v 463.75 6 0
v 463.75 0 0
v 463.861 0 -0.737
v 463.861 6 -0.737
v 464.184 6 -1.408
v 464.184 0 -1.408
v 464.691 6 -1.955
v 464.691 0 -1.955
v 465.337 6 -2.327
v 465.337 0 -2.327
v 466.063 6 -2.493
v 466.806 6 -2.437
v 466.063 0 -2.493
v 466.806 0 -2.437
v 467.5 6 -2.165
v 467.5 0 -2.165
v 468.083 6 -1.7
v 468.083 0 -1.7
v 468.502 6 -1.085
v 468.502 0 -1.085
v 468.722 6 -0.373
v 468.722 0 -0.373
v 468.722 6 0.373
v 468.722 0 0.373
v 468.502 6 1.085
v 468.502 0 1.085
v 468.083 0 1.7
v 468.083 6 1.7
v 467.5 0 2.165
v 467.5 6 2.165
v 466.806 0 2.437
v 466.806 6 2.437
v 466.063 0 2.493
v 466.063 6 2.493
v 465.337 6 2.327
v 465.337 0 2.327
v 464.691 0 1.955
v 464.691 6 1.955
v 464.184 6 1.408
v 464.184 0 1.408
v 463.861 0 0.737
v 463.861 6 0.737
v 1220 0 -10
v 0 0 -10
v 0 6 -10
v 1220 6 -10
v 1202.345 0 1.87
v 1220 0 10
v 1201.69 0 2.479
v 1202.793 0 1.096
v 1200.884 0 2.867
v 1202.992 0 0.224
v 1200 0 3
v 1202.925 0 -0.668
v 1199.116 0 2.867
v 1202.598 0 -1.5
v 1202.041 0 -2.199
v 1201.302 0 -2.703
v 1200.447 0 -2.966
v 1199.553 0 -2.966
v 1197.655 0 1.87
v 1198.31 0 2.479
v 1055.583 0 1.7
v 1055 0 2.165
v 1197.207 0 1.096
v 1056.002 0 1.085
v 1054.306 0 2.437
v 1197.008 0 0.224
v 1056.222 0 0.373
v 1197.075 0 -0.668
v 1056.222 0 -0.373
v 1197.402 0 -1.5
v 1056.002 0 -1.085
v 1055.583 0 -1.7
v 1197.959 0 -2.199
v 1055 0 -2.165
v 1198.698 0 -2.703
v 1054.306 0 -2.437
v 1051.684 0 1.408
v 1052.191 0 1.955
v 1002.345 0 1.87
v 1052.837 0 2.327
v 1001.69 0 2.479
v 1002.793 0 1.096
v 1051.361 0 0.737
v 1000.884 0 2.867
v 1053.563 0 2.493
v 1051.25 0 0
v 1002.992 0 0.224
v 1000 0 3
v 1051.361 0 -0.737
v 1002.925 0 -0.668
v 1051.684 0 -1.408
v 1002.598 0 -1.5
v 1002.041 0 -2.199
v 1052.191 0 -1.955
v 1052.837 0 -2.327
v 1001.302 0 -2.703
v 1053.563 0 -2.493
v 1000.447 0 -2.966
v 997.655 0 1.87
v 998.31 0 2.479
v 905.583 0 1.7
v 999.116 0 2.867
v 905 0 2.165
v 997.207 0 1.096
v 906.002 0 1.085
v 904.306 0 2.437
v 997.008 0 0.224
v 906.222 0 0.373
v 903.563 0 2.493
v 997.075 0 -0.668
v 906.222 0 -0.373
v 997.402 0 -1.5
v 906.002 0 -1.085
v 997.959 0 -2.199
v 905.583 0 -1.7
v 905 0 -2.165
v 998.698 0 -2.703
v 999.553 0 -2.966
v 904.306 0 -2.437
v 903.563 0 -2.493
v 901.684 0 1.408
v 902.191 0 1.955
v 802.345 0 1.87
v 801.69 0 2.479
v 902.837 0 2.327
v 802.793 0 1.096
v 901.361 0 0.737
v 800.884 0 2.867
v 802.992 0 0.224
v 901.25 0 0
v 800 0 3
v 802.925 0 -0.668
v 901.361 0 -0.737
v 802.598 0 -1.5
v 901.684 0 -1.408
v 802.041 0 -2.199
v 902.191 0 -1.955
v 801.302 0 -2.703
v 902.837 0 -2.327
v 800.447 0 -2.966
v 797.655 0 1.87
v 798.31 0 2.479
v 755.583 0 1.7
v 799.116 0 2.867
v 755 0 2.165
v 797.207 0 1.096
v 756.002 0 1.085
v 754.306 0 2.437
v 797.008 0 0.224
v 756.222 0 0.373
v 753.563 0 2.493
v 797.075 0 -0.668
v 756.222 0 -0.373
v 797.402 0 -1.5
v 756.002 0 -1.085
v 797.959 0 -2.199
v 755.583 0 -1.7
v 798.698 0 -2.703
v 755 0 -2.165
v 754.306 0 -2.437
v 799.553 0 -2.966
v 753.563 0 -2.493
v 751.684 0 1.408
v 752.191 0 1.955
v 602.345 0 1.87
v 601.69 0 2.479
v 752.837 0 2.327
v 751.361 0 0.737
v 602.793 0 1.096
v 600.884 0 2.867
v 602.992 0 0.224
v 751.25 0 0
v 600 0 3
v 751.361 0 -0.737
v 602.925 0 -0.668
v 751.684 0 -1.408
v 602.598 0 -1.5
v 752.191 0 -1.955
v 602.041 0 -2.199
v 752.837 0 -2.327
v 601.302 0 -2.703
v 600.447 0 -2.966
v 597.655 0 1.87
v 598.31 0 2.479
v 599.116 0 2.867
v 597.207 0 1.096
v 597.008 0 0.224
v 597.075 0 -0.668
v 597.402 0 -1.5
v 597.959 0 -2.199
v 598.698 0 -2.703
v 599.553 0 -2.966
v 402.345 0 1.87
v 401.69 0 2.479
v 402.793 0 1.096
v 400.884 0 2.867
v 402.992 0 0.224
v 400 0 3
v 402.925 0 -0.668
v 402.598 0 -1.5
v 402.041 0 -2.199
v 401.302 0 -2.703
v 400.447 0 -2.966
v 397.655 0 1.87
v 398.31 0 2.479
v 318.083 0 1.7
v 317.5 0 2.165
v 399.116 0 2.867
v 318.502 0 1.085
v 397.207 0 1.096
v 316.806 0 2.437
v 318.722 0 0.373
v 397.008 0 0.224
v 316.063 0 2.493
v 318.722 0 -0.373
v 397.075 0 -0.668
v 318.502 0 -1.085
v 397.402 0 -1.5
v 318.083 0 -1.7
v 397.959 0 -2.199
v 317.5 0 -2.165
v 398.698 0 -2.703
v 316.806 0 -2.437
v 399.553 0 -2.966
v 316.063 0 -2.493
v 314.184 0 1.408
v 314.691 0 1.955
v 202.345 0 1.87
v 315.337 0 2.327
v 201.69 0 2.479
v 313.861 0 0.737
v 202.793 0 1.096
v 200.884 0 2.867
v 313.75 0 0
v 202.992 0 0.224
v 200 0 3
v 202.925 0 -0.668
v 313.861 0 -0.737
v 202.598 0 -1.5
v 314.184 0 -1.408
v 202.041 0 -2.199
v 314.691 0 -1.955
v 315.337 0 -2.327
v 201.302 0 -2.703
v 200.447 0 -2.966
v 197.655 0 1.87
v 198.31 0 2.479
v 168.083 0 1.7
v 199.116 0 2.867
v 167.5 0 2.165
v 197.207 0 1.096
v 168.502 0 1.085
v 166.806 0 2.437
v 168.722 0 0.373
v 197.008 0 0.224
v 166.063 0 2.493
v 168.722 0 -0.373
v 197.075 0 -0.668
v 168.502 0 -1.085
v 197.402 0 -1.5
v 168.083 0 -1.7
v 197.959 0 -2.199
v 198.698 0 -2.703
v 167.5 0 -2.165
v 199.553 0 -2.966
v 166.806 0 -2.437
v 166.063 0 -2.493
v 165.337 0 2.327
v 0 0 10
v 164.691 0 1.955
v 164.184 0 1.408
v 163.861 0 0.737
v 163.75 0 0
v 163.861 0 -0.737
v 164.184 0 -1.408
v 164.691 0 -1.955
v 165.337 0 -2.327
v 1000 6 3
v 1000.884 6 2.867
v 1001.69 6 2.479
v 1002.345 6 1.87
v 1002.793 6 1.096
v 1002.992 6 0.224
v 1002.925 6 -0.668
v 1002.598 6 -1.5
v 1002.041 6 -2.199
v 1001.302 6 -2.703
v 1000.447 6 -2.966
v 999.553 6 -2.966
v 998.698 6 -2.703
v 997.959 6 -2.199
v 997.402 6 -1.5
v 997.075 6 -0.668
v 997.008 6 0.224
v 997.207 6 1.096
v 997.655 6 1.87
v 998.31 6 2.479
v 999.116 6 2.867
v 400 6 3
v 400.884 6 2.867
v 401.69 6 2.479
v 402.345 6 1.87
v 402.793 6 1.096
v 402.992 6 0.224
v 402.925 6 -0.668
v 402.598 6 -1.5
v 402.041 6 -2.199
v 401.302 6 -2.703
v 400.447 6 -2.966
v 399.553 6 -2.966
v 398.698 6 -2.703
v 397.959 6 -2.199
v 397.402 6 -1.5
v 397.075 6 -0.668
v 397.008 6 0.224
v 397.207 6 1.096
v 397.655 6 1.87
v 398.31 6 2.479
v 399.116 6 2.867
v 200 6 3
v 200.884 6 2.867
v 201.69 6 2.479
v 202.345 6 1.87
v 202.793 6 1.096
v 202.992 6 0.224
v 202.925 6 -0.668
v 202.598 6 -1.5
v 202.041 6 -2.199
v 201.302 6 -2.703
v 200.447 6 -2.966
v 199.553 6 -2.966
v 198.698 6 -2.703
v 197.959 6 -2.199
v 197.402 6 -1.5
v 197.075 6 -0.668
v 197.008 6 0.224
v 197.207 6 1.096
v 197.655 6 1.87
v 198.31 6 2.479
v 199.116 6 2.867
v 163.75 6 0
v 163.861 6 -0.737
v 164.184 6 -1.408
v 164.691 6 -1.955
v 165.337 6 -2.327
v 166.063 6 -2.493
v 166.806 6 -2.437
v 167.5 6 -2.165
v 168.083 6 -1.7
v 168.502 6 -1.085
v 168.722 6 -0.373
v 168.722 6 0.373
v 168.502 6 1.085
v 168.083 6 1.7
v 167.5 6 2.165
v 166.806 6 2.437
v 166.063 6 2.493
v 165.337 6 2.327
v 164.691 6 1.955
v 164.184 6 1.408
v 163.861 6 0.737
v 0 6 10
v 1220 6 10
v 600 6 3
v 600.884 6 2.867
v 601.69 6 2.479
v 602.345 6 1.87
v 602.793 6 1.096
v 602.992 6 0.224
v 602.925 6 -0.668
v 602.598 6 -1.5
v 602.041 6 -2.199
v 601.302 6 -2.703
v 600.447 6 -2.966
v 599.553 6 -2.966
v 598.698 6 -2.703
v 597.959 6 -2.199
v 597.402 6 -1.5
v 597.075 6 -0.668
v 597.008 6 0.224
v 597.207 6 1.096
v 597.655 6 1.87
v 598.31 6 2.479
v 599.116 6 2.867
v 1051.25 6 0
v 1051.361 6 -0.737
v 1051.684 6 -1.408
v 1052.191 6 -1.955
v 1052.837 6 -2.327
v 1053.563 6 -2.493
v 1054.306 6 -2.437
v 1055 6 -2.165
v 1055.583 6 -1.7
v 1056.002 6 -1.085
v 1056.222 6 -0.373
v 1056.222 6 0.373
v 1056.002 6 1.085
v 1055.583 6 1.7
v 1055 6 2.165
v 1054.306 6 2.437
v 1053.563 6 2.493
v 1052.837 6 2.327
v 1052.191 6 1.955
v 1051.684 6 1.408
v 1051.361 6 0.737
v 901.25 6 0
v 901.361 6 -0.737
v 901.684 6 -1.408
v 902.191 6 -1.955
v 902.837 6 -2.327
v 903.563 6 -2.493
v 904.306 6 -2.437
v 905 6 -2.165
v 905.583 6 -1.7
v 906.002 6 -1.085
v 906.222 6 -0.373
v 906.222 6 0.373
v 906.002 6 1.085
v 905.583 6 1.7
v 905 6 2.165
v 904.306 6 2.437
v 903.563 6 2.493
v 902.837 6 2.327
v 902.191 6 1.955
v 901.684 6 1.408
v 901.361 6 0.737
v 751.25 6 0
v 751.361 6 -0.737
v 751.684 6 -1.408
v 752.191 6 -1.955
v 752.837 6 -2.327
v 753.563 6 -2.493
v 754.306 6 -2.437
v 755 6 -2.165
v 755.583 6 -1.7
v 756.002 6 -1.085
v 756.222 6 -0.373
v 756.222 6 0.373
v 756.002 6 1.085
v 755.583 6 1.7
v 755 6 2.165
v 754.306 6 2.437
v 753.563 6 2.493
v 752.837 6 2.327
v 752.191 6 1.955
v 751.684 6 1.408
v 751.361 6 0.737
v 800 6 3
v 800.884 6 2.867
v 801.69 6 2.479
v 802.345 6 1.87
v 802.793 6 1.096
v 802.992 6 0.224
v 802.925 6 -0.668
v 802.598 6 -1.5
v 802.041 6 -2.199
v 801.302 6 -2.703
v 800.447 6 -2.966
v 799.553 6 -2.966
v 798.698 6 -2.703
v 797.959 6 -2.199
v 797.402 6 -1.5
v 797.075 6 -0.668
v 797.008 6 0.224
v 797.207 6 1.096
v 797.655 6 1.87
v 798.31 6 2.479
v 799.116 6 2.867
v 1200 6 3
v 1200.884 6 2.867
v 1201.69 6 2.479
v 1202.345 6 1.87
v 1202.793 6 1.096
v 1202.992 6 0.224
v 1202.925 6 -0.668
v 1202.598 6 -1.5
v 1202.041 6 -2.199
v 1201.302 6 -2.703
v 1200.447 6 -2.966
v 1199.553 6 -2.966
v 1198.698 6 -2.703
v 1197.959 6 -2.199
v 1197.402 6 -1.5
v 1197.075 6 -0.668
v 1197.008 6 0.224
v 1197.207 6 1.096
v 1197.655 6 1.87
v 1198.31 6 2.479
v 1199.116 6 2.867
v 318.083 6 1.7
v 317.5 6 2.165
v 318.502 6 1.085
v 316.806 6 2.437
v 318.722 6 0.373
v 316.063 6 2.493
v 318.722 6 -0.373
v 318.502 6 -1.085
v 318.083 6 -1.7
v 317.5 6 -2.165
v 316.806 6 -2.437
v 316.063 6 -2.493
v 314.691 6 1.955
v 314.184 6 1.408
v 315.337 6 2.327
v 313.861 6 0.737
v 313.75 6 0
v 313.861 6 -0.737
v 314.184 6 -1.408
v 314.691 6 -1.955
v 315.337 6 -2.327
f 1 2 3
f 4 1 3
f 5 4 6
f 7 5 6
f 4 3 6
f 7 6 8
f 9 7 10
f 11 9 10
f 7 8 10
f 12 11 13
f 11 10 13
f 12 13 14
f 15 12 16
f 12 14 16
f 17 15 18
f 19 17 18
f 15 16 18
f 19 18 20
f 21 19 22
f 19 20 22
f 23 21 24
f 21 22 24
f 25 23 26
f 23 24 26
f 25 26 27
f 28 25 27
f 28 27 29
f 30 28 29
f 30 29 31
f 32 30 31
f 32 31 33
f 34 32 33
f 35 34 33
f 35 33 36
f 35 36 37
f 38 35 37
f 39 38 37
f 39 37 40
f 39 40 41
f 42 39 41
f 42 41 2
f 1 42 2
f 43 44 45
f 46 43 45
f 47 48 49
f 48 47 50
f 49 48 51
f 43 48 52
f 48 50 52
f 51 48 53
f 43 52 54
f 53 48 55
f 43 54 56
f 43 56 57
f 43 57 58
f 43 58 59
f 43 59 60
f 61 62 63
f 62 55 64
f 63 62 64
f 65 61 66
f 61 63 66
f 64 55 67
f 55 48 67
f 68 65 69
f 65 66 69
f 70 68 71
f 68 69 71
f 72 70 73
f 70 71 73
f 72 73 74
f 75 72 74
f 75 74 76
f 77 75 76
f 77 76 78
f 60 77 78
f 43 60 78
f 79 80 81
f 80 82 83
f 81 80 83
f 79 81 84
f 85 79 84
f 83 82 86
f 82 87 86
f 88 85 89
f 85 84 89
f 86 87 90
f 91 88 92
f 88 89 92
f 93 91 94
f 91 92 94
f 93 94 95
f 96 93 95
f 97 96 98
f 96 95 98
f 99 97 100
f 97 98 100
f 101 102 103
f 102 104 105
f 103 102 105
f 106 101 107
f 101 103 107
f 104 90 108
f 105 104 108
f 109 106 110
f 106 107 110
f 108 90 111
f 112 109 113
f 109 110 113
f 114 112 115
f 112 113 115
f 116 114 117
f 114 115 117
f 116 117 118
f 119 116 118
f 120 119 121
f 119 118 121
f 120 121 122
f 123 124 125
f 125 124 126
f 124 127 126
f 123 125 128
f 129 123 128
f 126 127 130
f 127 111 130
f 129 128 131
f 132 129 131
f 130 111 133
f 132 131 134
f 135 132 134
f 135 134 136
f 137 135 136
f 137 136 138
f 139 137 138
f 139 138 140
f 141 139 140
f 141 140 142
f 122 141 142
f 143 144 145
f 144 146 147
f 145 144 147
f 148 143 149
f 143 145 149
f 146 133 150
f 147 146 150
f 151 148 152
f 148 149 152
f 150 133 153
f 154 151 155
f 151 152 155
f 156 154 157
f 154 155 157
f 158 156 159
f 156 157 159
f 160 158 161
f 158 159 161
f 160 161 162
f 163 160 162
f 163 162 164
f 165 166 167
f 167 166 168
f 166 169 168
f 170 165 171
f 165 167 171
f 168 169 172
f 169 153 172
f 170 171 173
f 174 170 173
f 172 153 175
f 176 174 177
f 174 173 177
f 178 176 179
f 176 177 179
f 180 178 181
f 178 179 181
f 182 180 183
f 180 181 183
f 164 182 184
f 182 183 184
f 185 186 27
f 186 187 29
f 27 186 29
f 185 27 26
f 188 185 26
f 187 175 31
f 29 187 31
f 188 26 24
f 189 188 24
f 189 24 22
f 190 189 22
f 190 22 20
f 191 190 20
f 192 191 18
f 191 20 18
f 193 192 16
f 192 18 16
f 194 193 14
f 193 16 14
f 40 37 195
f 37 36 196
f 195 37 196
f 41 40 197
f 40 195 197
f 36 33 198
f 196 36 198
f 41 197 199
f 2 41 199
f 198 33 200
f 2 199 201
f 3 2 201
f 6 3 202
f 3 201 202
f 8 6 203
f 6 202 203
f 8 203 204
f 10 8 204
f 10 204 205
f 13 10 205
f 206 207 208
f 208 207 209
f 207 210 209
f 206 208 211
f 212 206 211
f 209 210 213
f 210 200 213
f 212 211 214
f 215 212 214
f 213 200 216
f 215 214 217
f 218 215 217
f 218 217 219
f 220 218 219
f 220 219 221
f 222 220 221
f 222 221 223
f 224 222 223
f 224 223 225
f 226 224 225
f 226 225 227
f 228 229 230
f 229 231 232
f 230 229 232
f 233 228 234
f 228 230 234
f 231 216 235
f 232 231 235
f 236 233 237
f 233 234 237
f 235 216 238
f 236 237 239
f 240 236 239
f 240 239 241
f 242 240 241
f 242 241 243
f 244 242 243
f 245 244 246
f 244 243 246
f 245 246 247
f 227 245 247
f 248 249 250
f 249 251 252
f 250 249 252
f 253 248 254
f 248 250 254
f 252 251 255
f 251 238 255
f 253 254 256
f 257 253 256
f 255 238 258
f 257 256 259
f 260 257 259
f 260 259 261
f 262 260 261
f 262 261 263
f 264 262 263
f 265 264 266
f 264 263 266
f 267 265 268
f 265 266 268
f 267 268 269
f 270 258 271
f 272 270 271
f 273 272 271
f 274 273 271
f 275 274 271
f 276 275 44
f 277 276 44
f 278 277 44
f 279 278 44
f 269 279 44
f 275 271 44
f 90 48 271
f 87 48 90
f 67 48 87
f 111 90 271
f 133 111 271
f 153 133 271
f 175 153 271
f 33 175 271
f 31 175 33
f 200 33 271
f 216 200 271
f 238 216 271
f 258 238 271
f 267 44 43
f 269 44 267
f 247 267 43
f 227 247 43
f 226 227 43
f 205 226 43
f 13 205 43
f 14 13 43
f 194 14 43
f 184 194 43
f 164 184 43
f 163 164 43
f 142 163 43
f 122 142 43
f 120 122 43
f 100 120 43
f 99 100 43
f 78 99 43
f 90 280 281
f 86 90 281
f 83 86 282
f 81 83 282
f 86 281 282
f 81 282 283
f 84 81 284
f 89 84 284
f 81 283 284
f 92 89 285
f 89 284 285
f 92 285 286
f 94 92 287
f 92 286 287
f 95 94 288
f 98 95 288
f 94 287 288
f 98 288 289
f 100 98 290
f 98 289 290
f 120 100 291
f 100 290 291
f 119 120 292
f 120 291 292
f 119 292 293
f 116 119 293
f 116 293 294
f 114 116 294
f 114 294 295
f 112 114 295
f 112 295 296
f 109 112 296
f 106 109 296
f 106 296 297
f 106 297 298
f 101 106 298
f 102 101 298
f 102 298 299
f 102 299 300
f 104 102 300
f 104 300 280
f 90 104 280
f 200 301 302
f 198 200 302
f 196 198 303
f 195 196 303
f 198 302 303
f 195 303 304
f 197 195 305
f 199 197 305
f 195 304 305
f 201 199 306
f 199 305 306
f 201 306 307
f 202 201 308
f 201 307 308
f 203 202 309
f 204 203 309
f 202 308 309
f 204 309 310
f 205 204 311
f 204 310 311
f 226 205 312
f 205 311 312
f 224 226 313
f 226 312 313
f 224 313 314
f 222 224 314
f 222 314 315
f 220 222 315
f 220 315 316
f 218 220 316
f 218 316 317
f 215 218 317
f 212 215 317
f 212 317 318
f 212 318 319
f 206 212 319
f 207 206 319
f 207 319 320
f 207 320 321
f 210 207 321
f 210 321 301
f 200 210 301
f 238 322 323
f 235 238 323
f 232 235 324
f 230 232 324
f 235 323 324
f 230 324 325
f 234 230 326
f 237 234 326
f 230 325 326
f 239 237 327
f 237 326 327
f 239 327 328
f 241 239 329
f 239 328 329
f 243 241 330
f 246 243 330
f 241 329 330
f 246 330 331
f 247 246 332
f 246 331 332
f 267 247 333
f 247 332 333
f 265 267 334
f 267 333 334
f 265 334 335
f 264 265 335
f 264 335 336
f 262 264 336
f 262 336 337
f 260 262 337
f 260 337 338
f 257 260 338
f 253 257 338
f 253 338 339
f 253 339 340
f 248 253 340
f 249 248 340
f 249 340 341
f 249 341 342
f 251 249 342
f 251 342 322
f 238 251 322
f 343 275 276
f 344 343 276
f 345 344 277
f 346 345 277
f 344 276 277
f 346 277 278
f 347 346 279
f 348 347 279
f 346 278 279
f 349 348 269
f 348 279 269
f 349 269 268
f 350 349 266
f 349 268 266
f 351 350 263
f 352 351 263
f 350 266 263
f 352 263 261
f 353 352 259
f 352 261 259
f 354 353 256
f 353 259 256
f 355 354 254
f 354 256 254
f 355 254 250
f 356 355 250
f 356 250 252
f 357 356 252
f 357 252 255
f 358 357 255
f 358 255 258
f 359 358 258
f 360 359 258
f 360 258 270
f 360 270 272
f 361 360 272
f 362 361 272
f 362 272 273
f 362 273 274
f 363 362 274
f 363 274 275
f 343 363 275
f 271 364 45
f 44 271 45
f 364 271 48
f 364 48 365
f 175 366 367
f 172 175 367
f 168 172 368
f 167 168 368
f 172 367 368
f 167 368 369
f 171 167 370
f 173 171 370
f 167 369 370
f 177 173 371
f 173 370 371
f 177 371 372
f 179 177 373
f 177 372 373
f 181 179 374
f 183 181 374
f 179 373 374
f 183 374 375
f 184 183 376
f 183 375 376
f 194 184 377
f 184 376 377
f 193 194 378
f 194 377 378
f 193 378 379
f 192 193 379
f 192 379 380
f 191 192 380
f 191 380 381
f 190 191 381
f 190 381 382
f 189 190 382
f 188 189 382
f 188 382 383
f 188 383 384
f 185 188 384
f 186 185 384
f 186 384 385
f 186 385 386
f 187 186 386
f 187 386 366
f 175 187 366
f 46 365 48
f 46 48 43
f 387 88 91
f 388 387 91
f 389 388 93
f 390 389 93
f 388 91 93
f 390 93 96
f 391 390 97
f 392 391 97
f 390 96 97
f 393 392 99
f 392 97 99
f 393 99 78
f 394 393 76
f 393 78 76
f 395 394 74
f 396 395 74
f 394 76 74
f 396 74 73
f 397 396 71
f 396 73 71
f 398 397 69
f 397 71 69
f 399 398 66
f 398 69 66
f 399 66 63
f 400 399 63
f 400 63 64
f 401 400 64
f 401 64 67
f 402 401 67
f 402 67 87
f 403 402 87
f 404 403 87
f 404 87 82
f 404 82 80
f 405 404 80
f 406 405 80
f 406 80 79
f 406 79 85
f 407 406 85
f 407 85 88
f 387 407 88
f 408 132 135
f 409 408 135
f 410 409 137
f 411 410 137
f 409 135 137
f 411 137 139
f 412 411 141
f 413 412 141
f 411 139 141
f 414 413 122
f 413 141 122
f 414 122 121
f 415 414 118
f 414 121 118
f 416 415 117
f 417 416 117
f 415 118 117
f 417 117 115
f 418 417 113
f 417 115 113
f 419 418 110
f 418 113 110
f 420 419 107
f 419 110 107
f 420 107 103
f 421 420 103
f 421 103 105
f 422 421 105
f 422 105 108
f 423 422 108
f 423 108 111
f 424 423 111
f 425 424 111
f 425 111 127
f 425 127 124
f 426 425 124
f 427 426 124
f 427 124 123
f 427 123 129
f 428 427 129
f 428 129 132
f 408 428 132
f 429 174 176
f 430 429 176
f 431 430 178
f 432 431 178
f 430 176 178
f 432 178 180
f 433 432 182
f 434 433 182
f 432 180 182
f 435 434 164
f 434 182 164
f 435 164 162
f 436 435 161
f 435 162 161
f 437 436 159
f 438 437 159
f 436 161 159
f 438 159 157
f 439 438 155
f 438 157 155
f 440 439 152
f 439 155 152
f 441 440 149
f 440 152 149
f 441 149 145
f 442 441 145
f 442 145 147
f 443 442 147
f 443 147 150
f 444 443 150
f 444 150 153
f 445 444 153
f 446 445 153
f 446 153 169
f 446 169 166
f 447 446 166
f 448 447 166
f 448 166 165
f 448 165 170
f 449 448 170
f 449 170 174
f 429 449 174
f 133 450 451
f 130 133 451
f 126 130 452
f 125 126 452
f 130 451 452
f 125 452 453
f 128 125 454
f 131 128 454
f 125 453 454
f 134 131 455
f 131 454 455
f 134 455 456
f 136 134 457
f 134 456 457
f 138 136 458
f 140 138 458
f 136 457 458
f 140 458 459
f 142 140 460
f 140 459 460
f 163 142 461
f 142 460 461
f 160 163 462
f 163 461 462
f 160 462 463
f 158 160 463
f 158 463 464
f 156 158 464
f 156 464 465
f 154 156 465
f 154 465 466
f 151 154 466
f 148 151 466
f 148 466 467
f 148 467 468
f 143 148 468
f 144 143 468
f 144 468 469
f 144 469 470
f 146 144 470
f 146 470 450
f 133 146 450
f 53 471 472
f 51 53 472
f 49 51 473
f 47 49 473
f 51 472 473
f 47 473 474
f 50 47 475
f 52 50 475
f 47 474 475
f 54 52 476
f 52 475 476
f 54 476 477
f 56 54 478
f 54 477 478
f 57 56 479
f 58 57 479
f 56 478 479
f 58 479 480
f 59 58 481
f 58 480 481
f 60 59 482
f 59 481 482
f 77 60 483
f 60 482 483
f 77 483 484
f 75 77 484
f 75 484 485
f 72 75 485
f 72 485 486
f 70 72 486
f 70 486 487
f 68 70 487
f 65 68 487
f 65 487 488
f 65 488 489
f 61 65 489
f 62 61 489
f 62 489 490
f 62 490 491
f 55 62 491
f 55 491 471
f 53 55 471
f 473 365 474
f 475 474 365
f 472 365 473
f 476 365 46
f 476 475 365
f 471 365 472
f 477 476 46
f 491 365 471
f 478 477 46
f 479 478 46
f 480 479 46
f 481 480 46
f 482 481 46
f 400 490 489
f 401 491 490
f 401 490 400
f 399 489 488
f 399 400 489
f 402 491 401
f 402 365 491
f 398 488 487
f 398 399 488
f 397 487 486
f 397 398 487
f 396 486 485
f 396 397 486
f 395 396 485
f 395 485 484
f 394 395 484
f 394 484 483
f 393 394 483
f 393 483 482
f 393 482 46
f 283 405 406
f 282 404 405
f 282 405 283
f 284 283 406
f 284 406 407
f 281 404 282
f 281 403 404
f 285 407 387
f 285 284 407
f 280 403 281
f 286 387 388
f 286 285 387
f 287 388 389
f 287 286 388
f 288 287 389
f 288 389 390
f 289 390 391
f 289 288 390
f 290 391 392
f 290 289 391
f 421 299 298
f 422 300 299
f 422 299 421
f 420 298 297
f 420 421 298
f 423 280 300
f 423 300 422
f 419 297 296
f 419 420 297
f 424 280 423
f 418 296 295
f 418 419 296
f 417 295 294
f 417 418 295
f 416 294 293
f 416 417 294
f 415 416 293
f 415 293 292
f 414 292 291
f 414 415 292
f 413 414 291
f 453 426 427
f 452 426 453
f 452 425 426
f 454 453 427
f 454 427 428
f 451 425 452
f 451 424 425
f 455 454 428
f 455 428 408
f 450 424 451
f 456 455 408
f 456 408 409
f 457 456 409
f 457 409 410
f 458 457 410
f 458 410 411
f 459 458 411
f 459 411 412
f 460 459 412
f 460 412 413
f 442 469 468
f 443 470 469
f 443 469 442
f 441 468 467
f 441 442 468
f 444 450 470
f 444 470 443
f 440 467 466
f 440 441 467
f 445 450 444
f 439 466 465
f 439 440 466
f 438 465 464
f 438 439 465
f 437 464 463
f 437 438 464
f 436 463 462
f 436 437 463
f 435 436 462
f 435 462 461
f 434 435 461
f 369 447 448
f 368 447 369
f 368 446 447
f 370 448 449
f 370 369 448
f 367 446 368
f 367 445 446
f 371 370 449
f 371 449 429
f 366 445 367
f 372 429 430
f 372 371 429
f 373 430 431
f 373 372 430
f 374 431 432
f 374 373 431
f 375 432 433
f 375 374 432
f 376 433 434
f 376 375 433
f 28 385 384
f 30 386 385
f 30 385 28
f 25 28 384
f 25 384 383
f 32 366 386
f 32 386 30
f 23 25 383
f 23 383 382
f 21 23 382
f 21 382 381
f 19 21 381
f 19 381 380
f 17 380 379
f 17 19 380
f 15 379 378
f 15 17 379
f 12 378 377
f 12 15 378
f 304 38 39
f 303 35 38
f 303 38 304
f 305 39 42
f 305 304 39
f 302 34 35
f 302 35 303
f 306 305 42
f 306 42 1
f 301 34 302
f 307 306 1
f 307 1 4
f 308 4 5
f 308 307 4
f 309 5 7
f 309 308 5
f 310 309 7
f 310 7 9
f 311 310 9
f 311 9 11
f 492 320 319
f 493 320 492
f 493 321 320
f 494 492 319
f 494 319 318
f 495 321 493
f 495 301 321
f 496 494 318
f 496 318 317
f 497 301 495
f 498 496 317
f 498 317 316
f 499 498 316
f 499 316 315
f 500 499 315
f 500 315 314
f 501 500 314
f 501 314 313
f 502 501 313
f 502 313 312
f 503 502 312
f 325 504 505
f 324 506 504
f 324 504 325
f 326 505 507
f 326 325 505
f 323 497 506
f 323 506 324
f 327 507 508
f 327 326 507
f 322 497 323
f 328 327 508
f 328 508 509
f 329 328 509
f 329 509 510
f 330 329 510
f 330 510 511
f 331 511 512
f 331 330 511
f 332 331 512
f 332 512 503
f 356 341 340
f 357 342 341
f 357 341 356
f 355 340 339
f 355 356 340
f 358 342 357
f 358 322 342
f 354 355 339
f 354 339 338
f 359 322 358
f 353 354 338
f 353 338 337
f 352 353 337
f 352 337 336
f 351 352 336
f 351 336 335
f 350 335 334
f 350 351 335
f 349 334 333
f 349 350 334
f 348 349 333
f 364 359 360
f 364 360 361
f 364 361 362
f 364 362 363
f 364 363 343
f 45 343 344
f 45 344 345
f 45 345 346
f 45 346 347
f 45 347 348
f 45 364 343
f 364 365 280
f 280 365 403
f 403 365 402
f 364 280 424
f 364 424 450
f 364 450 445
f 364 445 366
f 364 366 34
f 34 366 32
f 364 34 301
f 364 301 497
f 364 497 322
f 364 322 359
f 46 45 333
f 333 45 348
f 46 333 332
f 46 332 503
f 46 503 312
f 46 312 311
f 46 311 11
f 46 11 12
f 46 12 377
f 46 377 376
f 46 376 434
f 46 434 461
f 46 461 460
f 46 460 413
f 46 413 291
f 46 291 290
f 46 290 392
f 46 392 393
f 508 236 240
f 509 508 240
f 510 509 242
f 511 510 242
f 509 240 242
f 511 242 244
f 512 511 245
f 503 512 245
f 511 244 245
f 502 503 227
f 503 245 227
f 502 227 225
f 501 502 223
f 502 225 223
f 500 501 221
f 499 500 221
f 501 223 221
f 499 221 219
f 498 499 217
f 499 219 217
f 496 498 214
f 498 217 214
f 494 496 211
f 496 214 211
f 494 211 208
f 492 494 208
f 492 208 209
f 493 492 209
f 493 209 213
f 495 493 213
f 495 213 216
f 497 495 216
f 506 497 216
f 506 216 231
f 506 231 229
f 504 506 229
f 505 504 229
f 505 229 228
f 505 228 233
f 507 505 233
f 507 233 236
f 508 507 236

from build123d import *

# Parameters (mm, degrees)
SKETCH1_W           = 20
SKETCH1_H           = 6
BOSS_EXTRUDE1_DEPTH = 1220
SKETCH2_R           = 3
CUT_EXTRUDE1_DEPTH  = 1221.055736432
M6_TAPPED_HOLE1_D   = 5


with BuildPart() as part:
    # Sketch1 → Boss-Extrude1 (new body)
    with BuildSketch(Plane(origin=(0, 0, 0), x_dir=(0, 0, -1), z_dir=(1, 0, 0))):
        with Locations((0, 3)):
            Rectangle(SKETCH1_W, SKETCH1_H)
    extrude(amount=BOSS_EXTRUDE1_DEPTH)

    # Sketch2 → Cut-Extrude1 (cut, through all)
    with BuildSketch(Plane(origin=(0, 6, 0), x_dir=(1, 0, 0), z_dir=(0, 1, 0))):
        with Locations(Location((200, 0, 0), (0, 0, 270))):
            Circle(SKETCH2_R)
        with Locations(Location((400, 0, 0), (0, 0, 270))):
            Circle(SKETCH2_R)
        with Locations(Location((600, 0, 0), (0, 0, 270))):
            Circle(SKETCH2_R)
        with Locations(Location((800, 0, 0), (0, 0, 270))):
            Circle(SKETCH2_R)
        with Locations(Location((1000, 0, 0), (0, 0, 270))):
            Circle(SKETCH2_R)
        with Locations(Location((1200, 0, 0), (0, 0, 270))):
            Circle(SKETCH2_R)
    extrude(amount=-CUT_EXTRUDE1_DEPTH, mode=Mode.SUBTRACT)

    # M6 Tapped Hole1 (through all)
    with Locations(Plane(origin=(0, 6, 0), x_dir=(1, 0, 0), z_dir=(0, 1, 0))):
        with Locations((1053.75, 0), (166.25, 0), (316.25, 0), (466.25, 0), (753.75, 0), (903.75, 0)):
            Hole(M6_TAPPED_HOLE1_D / 2)


solid = part.part
